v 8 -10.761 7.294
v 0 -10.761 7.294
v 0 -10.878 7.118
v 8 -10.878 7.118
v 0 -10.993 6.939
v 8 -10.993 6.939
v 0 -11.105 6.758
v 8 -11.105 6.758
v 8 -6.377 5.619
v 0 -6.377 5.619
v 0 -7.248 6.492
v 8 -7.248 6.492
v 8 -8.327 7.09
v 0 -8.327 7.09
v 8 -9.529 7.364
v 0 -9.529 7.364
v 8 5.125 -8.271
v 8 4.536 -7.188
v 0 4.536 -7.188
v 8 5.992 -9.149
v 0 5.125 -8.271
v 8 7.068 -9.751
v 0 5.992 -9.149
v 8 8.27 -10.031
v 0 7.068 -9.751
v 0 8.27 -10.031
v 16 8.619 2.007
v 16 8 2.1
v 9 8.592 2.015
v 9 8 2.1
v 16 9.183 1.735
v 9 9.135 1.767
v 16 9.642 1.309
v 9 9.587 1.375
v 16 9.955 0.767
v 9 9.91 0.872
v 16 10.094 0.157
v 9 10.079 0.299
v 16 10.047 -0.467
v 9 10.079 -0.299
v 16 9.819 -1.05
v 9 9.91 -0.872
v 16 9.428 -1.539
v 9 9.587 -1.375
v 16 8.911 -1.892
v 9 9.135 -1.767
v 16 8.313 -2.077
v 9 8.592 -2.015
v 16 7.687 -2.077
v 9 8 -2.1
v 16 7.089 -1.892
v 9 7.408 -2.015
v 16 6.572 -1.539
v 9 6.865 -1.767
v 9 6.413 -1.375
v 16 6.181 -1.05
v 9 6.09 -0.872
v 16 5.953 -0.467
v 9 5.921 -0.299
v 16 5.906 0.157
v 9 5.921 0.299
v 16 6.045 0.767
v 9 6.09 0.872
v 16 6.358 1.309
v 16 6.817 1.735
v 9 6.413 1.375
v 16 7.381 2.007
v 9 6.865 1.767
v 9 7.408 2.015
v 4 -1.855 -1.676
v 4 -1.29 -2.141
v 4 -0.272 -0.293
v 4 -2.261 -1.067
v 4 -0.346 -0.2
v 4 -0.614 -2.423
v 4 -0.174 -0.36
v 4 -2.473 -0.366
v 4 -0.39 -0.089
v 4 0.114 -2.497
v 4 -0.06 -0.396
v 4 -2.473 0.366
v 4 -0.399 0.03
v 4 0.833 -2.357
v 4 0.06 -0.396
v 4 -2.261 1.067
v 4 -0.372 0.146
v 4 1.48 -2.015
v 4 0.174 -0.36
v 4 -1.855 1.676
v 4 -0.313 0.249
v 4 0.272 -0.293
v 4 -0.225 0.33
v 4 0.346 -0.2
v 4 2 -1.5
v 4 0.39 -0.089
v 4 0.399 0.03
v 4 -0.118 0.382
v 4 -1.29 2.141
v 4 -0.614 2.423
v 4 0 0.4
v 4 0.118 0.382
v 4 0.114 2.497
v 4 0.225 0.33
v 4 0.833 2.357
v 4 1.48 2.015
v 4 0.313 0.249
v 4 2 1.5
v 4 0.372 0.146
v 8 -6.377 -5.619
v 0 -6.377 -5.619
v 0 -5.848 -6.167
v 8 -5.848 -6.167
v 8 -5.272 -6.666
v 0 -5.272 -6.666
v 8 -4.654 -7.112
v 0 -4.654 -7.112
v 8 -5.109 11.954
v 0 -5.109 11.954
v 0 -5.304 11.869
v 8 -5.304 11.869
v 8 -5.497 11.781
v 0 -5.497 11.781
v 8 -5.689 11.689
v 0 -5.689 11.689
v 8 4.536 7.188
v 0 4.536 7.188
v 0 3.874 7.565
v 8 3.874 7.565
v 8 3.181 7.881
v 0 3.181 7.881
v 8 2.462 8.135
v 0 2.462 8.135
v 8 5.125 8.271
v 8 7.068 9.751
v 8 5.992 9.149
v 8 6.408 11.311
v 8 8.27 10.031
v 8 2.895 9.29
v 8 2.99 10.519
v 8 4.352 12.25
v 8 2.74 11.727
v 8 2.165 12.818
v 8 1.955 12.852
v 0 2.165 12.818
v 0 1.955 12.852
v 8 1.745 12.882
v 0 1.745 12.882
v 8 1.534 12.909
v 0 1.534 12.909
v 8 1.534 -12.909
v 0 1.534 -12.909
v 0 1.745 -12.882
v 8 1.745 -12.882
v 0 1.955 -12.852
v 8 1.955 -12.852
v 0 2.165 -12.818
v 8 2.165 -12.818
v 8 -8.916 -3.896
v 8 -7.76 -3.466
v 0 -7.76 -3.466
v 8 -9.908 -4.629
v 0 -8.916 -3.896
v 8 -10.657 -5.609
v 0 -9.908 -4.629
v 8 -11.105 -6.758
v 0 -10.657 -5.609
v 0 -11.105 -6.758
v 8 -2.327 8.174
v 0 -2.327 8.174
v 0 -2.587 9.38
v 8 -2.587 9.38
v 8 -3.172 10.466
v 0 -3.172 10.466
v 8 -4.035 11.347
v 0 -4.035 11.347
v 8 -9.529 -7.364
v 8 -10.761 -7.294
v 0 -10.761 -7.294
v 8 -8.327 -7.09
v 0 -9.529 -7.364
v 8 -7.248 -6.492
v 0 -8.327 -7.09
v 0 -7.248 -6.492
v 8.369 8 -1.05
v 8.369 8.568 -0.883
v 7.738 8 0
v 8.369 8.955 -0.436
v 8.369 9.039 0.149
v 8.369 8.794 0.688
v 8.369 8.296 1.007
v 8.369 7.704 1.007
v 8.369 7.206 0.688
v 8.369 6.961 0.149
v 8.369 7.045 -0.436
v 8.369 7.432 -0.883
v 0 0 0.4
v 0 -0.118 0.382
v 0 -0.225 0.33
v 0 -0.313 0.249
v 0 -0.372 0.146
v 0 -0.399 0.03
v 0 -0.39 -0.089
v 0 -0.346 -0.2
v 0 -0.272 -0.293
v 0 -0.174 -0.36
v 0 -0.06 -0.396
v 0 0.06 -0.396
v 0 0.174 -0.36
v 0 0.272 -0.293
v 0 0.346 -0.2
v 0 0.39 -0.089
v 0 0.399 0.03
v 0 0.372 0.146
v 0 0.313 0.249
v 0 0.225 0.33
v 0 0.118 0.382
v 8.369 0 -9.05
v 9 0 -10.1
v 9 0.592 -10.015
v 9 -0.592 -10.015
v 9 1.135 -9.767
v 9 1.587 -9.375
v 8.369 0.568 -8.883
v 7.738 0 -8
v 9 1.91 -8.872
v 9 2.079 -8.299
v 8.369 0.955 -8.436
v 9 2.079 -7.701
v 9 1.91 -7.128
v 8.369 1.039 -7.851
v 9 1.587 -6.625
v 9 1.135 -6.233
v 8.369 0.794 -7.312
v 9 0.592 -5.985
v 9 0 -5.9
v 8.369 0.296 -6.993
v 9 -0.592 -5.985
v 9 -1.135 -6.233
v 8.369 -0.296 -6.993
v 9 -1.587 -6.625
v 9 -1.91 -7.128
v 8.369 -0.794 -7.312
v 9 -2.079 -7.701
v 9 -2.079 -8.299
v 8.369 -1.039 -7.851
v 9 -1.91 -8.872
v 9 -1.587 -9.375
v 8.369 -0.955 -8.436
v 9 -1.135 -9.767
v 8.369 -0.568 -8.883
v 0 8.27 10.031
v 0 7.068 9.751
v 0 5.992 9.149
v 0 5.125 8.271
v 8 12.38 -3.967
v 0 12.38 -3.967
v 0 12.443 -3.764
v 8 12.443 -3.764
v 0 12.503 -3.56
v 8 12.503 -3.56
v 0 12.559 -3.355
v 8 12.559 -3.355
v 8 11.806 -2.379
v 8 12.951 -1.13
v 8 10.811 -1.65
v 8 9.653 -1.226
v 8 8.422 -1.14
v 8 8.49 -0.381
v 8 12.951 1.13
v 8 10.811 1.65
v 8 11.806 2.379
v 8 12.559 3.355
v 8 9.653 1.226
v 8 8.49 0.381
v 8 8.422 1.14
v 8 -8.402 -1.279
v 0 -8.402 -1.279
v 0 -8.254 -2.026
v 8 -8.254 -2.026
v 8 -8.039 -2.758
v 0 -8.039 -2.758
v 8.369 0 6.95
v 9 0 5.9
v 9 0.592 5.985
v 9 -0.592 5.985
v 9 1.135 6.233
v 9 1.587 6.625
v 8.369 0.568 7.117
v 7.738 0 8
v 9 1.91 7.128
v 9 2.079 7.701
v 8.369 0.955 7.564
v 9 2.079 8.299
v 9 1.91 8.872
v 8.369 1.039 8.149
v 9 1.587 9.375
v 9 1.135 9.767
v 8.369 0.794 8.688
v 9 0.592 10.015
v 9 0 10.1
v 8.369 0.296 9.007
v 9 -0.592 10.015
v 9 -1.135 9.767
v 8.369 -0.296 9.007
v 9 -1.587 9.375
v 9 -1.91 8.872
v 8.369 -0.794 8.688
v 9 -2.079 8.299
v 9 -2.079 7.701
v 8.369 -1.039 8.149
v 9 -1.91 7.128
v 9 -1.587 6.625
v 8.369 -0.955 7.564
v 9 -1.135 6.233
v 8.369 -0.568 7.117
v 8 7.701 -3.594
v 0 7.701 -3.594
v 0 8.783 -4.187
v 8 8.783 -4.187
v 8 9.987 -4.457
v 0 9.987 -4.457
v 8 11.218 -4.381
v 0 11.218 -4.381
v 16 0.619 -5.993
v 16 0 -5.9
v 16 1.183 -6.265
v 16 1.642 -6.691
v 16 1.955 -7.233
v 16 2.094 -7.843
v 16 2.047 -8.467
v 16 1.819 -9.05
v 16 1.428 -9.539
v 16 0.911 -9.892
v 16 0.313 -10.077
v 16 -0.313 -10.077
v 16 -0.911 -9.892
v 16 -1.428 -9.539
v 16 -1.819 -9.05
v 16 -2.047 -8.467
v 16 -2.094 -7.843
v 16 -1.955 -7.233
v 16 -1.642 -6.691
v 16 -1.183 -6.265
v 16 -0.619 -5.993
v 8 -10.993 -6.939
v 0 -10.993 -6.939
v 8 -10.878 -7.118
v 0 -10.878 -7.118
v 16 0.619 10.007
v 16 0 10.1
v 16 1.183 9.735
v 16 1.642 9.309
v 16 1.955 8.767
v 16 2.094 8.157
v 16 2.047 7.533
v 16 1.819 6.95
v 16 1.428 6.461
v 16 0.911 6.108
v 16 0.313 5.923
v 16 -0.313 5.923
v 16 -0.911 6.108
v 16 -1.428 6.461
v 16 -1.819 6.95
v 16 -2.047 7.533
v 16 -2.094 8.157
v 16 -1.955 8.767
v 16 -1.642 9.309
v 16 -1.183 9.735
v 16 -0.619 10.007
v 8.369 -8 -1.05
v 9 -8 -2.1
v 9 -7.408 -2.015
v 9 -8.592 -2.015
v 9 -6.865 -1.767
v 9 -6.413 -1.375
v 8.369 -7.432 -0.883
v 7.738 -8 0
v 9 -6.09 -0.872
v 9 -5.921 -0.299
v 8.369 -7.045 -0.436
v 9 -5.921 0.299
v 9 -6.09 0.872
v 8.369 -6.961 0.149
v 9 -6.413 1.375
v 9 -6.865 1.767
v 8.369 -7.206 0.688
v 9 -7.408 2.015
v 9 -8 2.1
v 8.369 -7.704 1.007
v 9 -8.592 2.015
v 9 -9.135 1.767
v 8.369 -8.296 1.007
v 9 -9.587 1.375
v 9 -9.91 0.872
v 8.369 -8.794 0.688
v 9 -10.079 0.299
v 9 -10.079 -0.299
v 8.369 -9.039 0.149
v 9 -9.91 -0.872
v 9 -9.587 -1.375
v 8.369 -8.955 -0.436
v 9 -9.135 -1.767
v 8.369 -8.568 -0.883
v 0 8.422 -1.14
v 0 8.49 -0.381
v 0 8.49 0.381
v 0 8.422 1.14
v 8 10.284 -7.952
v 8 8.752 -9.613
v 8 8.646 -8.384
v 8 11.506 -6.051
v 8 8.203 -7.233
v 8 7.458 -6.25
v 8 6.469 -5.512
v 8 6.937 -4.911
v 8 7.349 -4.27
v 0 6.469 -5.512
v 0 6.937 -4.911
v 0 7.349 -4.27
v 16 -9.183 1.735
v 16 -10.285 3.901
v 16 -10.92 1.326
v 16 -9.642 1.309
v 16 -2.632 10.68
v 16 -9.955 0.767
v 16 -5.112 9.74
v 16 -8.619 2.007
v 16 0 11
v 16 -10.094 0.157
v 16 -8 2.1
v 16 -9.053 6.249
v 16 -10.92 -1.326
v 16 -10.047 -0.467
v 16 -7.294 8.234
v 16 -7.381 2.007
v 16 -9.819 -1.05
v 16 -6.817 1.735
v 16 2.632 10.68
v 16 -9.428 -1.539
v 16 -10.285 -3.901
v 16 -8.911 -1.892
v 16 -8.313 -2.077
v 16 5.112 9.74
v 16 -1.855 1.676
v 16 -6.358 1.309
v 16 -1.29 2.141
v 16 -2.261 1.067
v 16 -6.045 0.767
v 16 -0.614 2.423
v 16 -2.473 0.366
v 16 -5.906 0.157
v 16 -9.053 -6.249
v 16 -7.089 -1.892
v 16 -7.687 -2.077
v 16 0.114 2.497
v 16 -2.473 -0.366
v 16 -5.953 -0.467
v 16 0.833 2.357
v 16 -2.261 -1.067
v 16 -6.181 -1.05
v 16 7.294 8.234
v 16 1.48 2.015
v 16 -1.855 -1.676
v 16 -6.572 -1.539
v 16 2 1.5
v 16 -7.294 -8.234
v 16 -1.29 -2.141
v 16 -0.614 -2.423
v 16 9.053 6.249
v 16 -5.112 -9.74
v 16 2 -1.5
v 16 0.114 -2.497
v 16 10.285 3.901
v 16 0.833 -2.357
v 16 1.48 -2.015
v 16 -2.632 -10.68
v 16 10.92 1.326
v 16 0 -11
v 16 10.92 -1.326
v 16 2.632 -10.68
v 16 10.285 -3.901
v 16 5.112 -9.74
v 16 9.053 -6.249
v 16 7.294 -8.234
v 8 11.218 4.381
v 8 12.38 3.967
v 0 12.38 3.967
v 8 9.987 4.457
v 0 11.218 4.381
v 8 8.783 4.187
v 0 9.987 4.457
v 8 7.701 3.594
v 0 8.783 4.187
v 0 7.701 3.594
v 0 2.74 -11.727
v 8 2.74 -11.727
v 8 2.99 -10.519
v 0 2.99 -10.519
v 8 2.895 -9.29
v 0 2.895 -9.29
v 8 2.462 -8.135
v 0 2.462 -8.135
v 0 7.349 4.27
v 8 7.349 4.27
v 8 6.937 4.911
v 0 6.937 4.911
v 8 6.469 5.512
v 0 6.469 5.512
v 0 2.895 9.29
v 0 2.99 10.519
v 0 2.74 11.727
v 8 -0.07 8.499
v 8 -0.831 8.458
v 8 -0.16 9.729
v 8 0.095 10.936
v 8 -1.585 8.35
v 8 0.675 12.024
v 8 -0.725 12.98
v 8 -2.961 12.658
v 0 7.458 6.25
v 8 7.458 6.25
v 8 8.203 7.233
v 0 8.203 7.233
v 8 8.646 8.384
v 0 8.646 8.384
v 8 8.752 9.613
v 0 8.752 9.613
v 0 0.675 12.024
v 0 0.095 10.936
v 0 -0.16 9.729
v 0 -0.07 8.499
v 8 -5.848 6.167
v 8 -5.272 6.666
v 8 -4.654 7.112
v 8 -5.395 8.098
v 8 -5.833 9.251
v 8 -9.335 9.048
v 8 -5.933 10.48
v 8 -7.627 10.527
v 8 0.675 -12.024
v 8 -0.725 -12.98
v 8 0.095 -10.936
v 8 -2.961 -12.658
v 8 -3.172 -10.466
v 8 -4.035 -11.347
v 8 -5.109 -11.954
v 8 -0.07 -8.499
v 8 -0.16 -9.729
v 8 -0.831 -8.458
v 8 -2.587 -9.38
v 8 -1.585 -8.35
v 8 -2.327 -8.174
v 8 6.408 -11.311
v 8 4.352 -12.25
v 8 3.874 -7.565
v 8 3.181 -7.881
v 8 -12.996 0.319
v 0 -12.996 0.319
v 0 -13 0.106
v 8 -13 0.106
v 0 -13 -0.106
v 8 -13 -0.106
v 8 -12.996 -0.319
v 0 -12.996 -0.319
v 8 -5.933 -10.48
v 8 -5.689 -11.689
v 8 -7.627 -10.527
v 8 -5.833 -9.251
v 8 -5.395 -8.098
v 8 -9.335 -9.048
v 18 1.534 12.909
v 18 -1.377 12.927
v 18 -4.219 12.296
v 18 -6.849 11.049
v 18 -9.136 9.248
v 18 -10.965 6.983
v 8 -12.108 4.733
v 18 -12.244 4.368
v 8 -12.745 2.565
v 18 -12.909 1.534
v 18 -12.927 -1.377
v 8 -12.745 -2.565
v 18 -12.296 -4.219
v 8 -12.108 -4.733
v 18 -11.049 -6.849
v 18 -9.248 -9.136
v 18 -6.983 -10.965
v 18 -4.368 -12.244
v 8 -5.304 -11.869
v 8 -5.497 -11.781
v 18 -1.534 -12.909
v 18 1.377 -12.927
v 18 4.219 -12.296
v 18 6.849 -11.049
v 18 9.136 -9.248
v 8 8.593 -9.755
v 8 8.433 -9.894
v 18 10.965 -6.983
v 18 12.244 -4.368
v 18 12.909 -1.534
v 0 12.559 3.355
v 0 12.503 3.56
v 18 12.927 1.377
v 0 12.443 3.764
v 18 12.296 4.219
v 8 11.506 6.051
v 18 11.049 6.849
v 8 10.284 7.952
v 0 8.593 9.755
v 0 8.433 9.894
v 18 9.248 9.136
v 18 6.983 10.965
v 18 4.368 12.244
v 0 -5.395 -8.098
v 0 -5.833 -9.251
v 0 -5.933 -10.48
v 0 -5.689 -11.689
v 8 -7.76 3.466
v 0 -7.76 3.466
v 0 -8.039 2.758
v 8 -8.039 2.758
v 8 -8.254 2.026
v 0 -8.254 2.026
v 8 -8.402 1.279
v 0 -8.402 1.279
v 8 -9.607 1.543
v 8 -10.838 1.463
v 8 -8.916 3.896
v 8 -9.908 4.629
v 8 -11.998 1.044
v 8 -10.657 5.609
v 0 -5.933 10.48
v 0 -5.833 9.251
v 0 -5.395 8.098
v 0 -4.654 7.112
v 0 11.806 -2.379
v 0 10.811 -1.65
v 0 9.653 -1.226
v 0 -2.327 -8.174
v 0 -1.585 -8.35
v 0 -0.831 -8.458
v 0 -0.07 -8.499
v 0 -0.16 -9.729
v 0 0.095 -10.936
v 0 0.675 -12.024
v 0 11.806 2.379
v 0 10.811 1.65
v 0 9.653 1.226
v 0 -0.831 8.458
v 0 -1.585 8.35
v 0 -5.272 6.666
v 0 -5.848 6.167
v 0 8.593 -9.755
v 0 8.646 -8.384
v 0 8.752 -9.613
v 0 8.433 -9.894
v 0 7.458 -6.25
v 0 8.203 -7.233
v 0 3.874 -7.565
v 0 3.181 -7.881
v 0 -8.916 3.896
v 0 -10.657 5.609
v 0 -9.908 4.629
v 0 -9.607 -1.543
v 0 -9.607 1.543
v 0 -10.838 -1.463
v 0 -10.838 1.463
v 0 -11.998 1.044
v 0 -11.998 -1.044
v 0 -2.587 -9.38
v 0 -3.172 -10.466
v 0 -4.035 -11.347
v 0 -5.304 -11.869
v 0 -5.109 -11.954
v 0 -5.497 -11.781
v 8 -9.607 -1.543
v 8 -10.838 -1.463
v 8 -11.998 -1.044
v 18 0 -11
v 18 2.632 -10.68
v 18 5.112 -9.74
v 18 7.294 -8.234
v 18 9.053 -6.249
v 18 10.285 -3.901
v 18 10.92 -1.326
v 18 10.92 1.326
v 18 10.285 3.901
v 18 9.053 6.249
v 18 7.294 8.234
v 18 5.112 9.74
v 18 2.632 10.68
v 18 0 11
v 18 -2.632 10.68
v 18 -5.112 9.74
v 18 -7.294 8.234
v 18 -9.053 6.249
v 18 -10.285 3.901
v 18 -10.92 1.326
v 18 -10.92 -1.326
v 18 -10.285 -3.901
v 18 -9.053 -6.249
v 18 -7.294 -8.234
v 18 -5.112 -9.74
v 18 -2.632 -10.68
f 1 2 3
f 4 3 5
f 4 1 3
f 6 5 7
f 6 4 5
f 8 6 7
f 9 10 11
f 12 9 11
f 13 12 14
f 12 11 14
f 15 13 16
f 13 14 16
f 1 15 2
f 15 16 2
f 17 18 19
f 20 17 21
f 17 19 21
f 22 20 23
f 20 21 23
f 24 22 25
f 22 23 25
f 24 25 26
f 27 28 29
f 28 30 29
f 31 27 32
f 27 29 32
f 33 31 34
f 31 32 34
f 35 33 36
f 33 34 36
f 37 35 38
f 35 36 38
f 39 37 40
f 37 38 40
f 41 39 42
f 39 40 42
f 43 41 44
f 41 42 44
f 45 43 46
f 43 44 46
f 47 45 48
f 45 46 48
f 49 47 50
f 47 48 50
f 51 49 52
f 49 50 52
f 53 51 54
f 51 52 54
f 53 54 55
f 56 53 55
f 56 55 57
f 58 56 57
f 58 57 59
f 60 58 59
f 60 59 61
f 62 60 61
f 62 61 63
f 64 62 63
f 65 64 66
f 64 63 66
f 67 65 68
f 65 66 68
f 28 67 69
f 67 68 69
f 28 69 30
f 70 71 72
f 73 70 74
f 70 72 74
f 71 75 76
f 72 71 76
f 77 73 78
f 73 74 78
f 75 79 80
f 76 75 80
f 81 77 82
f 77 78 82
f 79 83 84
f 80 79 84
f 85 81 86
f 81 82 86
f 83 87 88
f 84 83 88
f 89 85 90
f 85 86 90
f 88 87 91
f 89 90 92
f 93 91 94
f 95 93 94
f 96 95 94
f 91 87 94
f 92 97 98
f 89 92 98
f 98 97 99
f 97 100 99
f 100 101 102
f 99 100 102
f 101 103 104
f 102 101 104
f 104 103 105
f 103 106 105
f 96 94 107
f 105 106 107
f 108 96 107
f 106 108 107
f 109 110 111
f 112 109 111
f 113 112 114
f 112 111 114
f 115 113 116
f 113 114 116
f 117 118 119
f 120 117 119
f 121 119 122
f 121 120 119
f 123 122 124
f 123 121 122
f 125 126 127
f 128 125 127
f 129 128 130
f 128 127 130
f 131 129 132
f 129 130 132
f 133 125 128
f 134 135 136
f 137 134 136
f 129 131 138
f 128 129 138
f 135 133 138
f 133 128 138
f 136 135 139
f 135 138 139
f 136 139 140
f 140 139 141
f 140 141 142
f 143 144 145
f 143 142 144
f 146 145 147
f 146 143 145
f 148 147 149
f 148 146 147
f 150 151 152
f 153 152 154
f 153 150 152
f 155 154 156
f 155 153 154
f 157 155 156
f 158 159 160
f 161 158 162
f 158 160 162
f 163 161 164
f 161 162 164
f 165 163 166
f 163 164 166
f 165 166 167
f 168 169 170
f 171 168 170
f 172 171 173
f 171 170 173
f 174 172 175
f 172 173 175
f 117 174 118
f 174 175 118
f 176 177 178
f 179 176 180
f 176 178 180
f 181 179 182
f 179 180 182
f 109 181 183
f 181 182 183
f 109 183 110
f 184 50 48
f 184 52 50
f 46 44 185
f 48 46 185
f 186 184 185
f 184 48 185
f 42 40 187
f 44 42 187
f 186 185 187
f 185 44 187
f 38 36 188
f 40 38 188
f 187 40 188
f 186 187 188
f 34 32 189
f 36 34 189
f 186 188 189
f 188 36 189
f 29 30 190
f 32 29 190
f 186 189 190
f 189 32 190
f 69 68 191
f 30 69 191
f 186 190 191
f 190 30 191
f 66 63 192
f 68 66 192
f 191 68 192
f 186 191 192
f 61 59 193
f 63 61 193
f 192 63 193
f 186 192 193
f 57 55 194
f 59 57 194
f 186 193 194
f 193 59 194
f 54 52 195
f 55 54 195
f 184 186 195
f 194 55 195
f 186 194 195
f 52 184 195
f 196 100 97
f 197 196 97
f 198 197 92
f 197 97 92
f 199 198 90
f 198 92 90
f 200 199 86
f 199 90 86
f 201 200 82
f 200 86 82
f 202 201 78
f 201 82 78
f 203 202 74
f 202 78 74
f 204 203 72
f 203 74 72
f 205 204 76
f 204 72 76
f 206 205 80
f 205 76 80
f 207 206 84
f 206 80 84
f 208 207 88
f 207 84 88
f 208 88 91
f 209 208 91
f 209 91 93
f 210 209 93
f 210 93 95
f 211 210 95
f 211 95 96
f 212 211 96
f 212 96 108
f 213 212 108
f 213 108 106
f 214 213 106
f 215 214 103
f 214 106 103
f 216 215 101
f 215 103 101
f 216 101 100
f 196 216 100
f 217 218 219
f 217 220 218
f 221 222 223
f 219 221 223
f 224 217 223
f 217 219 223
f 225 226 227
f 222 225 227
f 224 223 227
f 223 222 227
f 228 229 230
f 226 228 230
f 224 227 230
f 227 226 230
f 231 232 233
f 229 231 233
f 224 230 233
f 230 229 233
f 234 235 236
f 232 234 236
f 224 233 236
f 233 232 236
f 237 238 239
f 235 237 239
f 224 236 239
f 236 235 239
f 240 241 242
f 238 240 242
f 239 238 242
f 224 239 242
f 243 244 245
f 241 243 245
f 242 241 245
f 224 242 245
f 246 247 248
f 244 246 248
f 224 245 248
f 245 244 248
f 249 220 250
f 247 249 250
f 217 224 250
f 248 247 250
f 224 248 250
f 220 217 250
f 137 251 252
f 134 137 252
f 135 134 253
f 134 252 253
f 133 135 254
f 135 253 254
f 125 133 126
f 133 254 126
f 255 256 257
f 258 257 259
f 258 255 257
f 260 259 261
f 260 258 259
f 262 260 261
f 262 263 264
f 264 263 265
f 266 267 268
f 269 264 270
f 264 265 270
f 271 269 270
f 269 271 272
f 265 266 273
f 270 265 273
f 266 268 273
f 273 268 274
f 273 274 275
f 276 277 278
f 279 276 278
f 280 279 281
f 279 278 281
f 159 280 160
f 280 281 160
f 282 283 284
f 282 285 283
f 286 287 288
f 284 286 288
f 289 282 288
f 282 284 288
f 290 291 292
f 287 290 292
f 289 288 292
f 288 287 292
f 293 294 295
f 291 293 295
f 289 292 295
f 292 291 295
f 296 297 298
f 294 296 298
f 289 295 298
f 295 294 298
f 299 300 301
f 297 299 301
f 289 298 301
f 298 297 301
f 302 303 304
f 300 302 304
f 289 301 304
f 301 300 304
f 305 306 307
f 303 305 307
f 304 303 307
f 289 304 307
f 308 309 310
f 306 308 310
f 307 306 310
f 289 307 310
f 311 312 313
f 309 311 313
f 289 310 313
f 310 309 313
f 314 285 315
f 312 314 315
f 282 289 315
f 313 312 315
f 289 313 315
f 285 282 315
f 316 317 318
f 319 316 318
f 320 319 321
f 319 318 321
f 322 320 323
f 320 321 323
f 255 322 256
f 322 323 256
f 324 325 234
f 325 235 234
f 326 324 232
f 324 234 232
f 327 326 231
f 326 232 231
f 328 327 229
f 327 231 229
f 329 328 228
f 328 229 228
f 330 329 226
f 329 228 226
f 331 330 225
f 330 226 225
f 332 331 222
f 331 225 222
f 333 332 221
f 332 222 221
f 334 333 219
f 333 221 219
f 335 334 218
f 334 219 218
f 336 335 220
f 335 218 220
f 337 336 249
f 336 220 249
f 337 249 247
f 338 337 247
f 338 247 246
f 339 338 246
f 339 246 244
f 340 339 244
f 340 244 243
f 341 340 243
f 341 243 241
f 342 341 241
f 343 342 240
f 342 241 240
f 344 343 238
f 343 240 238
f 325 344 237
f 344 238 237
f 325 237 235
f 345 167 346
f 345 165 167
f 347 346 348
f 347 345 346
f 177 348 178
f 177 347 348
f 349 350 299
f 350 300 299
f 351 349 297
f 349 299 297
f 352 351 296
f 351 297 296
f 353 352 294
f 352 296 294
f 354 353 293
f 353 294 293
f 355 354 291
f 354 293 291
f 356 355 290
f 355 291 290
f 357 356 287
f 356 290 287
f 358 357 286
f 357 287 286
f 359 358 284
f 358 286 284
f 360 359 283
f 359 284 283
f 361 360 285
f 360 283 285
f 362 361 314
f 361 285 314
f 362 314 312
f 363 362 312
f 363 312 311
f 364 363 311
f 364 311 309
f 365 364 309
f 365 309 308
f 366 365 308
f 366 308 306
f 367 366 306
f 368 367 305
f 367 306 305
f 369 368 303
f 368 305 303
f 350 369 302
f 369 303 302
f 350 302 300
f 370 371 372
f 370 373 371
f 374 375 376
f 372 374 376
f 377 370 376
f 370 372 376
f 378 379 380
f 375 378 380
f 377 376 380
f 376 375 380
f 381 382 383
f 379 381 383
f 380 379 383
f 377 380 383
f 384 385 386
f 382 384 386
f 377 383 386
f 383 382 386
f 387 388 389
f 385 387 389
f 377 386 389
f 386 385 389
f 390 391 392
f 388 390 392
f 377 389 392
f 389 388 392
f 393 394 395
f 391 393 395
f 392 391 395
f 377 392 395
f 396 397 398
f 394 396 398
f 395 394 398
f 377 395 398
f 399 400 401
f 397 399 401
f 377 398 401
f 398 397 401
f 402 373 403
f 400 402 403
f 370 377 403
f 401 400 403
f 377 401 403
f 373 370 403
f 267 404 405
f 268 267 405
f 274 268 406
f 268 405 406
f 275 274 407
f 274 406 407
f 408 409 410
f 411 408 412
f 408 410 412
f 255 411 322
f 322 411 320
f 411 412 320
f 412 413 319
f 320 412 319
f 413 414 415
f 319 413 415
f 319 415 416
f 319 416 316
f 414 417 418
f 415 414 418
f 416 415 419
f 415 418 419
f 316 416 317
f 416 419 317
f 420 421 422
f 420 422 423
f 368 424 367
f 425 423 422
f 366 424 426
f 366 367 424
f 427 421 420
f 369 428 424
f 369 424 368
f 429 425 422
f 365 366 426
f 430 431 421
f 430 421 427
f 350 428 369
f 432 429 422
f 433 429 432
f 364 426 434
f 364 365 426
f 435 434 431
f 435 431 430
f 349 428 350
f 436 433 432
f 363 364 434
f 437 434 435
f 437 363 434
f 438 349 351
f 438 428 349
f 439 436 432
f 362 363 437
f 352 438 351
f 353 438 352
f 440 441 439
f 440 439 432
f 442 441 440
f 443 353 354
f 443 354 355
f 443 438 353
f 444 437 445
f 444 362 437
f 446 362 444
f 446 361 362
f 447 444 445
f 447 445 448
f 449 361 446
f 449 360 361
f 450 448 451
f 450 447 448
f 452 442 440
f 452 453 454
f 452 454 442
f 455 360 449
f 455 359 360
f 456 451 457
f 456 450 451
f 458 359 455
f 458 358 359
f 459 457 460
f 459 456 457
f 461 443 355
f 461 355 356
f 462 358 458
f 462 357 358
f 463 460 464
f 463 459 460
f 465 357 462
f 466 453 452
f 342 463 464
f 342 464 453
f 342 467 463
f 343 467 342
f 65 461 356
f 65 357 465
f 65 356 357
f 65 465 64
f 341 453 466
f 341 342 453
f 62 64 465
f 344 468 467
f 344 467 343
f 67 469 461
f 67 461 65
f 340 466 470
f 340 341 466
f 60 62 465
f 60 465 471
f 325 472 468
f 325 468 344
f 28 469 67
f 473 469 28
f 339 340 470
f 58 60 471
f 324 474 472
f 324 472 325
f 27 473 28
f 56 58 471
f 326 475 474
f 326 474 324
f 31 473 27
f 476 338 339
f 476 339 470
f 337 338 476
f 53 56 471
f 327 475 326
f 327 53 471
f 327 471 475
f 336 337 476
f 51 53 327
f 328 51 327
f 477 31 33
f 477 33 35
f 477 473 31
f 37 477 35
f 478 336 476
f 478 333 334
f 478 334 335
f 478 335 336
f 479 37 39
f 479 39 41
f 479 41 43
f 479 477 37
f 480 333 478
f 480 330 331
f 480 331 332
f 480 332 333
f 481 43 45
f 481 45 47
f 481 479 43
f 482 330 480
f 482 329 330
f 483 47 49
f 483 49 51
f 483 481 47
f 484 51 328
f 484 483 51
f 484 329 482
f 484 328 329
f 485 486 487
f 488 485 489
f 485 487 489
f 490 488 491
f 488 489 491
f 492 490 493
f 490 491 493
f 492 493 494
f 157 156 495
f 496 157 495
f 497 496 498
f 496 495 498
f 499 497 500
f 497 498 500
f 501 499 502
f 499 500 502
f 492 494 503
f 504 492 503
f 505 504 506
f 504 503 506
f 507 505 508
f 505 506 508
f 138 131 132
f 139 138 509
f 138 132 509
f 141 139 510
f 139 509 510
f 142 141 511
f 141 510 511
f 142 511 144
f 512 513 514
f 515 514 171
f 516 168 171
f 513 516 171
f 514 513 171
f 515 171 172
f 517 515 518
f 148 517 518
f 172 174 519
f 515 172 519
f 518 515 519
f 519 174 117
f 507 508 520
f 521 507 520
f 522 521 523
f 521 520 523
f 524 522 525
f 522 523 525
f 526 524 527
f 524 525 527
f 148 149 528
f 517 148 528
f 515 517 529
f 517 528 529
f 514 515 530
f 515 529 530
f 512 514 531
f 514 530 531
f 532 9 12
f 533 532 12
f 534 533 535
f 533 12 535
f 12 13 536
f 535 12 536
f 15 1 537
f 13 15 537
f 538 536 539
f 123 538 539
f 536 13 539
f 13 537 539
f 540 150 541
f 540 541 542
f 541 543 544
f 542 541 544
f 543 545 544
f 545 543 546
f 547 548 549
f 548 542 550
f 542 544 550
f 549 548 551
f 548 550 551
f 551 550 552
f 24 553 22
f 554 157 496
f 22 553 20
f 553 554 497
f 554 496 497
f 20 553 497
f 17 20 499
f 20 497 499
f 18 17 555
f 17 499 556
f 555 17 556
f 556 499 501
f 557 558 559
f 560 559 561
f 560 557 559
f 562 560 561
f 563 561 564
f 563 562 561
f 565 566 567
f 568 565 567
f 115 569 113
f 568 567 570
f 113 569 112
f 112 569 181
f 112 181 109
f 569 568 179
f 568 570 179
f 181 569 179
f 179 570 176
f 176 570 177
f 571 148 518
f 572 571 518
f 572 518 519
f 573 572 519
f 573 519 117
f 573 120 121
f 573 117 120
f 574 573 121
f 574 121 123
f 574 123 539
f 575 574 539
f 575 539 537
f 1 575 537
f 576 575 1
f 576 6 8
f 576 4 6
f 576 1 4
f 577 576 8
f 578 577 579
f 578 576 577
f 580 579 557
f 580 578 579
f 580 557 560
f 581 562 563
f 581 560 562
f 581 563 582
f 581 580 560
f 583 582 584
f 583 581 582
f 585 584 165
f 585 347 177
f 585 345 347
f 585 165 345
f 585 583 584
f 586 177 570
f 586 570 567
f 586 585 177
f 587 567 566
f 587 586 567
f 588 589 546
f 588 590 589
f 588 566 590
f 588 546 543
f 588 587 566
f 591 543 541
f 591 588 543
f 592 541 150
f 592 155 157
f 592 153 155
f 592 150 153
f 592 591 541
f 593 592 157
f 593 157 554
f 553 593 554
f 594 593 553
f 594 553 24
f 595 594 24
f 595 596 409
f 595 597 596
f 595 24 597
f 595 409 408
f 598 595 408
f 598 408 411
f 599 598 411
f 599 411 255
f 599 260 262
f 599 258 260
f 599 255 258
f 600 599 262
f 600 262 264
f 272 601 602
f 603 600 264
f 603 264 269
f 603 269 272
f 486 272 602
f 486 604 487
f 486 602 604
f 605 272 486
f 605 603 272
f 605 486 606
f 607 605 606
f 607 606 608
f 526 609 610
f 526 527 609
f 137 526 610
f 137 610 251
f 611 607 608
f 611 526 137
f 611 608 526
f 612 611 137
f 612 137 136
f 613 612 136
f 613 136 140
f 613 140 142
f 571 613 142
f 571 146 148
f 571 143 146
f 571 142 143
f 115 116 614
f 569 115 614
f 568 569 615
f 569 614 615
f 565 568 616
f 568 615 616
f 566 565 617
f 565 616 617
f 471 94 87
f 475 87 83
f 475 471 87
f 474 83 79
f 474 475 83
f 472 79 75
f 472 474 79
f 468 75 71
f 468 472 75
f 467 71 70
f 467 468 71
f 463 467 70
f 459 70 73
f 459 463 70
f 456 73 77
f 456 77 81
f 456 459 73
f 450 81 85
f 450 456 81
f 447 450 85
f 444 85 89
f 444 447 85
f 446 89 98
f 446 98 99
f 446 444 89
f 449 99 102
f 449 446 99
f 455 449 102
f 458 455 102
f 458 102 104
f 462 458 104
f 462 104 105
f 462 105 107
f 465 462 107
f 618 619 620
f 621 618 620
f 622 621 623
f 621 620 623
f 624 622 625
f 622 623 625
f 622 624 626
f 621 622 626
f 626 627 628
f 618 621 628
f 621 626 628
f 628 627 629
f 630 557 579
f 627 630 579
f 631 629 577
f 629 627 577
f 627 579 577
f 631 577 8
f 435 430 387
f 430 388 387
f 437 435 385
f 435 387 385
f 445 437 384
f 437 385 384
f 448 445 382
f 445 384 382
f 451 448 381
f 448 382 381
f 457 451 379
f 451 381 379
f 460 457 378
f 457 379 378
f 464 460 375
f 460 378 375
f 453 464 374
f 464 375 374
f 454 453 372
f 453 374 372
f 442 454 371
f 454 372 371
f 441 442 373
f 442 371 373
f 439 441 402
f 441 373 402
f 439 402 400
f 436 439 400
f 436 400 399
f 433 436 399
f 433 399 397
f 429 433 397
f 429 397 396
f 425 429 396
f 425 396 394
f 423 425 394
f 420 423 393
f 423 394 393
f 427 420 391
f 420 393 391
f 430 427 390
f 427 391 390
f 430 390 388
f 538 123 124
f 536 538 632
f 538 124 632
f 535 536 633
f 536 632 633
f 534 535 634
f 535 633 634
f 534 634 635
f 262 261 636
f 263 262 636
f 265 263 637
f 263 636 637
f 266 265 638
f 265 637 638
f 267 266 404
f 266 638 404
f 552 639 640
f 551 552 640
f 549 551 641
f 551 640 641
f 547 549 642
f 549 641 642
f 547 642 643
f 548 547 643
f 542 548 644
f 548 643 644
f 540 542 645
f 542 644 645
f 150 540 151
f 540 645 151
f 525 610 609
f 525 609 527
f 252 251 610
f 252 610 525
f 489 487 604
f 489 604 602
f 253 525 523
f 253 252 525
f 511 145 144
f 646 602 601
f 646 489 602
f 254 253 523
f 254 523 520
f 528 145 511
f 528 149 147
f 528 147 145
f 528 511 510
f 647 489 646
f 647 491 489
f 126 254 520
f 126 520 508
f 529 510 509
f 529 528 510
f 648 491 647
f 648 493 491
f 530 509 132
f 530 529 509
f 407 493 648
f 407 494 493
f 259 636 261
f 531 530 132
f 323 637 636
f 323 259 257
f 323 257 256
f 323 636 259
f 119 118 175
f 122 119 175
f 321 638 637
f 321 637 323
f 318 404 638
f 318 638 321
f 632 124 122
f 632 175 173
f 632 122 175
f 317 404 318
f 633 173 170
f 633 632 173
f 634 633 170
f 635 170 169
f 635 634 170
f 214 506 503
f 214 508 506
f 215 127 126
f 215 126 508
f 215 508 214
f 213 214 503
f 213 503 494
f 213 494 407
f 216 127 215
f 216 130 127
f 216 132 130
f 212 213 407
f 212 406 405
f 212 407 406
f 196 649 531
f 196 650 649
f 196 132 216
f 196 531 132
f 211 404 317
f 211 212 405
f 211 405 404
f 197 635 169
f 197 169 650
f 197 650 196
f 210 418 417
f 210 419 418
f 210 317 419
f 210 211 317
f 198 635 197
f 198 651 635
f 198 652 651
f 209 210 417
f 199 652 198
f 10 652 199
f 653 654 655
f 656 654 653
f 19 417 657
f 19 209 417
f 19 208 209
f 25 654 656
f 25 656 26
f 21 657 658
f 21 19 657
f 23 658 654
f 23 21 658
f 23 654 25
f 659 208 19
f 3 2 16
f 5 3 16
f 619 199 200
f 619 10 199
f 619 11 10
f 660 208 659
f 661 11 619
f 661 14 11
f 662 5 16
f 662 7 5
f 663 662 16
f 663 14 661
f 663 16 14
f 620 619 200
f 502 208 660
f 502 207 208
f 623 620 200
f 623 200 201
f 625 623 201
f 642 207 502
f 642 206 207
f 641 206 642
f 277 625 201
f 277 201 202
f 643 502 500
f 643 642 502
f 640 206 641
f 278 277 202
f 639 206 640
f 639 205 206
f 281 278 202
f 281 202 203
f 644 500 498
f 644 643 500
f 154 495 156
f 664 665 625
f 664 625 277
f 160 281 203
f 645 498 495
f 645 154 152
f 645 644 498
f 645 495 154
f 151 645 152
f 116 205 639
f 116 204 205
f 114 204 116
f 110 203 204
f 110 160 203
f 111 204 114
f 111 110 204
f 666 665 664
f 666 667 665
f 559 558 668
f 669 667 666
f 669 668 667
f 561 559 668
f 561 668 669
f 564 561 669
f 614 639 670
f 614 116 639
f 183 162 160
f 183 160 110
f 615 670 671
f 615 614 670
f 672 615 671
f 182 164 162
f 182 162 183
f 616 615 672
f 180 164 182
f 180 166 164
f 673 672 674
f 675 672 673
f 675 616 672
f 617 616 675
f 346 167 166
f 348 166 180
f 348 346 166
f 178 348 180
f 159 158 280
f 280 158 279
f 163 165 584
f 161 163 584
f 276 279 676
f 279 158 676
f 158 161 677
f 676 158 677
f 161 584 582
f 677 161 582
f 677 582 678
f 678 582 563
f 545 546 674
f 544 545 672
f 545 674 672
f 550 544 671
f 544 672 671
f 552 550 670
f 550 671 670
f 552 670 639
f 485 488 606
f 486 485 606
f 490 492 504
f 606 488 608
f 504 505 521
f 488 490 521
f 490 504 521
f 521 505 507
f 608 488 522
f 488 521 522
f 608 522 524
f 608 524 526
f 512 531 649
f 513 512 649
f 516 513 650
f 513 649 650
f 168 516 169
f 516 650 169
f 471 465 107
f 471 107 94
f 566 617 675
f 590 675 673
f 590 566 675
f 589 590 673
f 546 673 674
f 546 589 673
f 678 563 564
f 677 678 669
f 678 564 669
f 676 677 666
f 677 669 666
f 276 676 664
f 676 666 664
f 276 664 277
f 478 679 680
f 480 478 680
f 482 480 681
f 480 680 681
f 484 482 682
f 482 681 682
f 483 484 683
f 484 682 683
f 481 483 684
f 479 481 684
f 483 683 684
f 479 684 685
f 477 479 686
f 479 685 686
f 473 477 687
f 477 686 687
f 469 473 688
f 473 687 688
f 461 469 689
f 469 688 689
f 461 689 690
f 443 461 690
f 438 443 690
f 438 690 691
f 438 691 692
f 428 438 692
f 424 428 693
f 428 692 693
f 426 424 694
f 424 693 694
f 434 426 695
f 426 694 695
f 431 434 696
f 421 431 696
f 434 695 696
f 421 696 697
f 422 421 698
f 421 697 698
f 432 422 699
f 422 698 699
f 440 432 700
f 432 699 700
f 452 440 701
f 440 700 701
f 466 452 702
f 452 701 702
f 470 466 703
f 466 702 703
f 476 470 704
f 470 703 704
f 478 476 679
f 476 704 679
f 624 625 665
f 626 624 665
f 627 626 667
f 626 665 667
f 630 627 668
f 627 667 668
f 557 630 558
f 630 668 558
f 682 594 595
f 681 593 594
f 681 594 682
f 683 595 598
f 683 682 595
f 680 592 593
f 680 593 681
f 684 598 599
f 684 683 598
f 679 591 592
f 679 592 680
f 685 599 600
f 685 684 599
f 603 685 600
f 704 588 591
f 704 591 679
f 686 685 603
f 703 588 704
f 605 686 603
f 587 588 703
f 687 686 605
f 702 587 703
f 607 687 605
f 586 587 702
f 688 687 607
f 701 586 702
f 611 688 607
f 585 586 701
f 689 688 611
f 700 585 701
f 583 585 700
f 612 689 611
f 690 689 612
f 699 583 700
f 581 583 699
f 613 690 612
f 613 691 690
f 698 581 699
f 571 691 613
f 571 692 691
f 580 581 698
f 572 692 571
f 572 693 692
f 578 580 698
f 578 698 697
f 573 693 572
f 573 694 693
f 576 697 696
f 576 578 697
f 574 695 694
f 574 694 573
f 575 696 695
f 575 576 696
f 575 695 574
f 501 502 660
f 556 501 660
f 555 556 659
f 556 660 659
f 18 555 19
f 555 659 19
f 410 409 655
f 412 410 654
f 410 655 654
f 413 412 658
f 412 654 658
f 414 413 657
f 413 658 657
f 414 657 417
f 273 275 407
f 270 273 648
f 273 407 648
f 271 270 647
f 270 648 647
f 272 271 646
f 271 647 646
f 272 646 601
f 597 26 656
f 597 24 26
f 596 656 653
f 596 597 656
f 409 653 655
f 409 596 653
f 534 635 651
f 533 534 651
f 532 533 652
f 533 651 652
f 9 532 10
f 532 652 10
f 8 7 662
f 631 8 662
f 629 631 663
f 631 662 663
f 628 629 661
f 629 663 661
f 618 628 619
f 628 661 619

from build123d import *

# Parameters (mm, degrees)
BASPROSKE_W                  = 8
BASPROSKE_H                  = 13
TOOTHCUT_DEPTH               = 21.049937656
TEETHCUTS_COUNT              = 11
TEETHCUTS_ANGLE              = 327.272727273
BORSKE_R                     = 0.4
BORE_DEPTH                   = 50.0000508
ESTRUSIONE_ESTRUSIONE1_START = 10
SCHIZZO2_R                   = 13
ESTRUSIONE_ESTRUSIONE1_DEPTH = 10
TAGLIO_ESTRUSIONE1_DEPTH     = 14
FORO_PER_VITE_M3_1_D         = 4.2
FORO_PER_VITE_M3_1_DEPTH     = 9
FORO_PER_VITE_M3_1_TIP       = 1.2618073
SCHIZZO5_R                   = 11
TAGLIO_ESTRUSIONE2_DEPTH     = 2


with BuildPart() as part:
    # BasProSke → Base-Revolve (revolve)
    with BuildSketch(Plane(origin=(0, 0, 0), x_dir=(1, 0, 0), z_dir=(0, 1, 0)), mode=Mode.PRIVATE) as base_revolve_sk:
        with Locations((4, 6.5)):
            Rectangle(BASPROSKE_W, BASPROSKE_H)
    revolve(base_revolve_sk.sketch.rotate(Axis((-10, 0, 0), (1, 0, 0)), 180), axis=Axis((-10, 0, 0), (1, 0, 0)))

    # TooCutSke → ToothCut (cut, through all)
    with BuildSketch(Plane(origin=(0, 0, 0), x_dir=(0, 0, -1), z_dir=(1, 0, 0))):
        with BuildLine():
            ThreePointArc((1.139858048, 8.422216135), (0, 8.499), (-1.139858048, 8.422216135))
            ThreePointArc((-1.139858048, 8.422216135), (-1.658602184, 10.826907356), (-3.387115532, 12.577300725))
            ThreePointArc((-3.387115532, 12.577300725), (0, 13.0254), (3.387115532, 12.577300725))
            ThreePointArc((3.387115532, 12.577300725), (1.658602184, 10.826907356), (1.139858048, 8.422216135))
        make_face()
    toothcut = extrude(amount=TOOTHCUT_DEPTH, mode=Mode.SUBTRACT)

    # TeethCuts: ToothCut ×11 about axis
    teethcuts_axis = Axis((-10, 0, 0), (1, 0, 0))
    for i in range(1, TEETHCUTS_COUNT):
        add(toothcut.rotate(teethcuts_axis, i * TEETHCUTS_ANGLE / (TEETHCUTS_COUNT - 1)), mode=Mode.SUBTRACT)

    # BorSke → Bore (cut, symmetric)
    with BuildSketch(Plane(origin=(0, 0, 0), x_dir=(0, 0, -1), z_dir=(1, 0, 0))):
        with Locations(Location((0, 0, 0), (0, 0, 180))):
            Circle(BORSKE_R)
    extrude(amount=BORE_DEPTH, both=True, mode=Mode.SUBTRACT)

    # Schizzo2 → Estrusione-Estrusione1 (add)
    with BuildSketch(Plane(origin=(8, 0, 0), x_dir=(0, 0, -1), z_dir=(1, 0, 0)).offset(ESTRUSIONE_ESTRUSIONE1_START)):
        with Locations(Location((0, 0, 0), (0, 0, 173.223714884))):
            Circle(SCHIZZO2_R)
    extrude(amount=-ESTRUSIONE_ESTRUSIONE1_DEPTH)

    # Schizzo1 → Taglio-Estrusione1 (cut)
    with BuildSketch(Plane(origin=(18, 0, 0), x_dir=(0, 0, -1), z_dir=(1, 0, 0))):
        with BuildLine():
            Line((-1.5, 2), (1.5, 2))
            ThreePointArc((1.5, 2), (0, -2.5), (-1.5, 2))
        make_face()
    extrude(amount=-TAGLIO_ESTRUSIONE1_DEPTH, mode=Mode.SUBTRACT)

    # Foro per Vite M3-1
    with Locations(Plane(origin=(18, 0, 0), x_dir=(0, 0, -1), z_dir=(1, 0, 0))):
        with Locations((0, 8), (8, 0), (0, -8), (-8, 0)):
            Hole(FORO_PER_VITE_M3_1_D / 2, depth=FORO_PER_VITE_M3_1_DEPTH)
            with Locations((0, 0, -(FORO_PER_VITE_M3_1_DEPTH + FORO_PER_VITE_M3_1_TIP / 2))):  # 118° drill point
                Cone(0, FORO_PER_VITE_M3_1_D / 2, FORO_PER_VITE_M3_1_TIP, mode=Mode.SUBTRACT)

    # Schizzo5 → Taglio-Estrusione2 (cut)
    with BuildSketch(Plane(origin=(18, 0, 0), x_dir=(0, 0, -1), z_dir=(1, 0, 0))):
        Circle(SCHIZZO5_R)
    extrude(amount=-TAGLIO_ESTRUSIONE2_DEPTH, mode=Mode.SUBTRACT)


solid = part.part
